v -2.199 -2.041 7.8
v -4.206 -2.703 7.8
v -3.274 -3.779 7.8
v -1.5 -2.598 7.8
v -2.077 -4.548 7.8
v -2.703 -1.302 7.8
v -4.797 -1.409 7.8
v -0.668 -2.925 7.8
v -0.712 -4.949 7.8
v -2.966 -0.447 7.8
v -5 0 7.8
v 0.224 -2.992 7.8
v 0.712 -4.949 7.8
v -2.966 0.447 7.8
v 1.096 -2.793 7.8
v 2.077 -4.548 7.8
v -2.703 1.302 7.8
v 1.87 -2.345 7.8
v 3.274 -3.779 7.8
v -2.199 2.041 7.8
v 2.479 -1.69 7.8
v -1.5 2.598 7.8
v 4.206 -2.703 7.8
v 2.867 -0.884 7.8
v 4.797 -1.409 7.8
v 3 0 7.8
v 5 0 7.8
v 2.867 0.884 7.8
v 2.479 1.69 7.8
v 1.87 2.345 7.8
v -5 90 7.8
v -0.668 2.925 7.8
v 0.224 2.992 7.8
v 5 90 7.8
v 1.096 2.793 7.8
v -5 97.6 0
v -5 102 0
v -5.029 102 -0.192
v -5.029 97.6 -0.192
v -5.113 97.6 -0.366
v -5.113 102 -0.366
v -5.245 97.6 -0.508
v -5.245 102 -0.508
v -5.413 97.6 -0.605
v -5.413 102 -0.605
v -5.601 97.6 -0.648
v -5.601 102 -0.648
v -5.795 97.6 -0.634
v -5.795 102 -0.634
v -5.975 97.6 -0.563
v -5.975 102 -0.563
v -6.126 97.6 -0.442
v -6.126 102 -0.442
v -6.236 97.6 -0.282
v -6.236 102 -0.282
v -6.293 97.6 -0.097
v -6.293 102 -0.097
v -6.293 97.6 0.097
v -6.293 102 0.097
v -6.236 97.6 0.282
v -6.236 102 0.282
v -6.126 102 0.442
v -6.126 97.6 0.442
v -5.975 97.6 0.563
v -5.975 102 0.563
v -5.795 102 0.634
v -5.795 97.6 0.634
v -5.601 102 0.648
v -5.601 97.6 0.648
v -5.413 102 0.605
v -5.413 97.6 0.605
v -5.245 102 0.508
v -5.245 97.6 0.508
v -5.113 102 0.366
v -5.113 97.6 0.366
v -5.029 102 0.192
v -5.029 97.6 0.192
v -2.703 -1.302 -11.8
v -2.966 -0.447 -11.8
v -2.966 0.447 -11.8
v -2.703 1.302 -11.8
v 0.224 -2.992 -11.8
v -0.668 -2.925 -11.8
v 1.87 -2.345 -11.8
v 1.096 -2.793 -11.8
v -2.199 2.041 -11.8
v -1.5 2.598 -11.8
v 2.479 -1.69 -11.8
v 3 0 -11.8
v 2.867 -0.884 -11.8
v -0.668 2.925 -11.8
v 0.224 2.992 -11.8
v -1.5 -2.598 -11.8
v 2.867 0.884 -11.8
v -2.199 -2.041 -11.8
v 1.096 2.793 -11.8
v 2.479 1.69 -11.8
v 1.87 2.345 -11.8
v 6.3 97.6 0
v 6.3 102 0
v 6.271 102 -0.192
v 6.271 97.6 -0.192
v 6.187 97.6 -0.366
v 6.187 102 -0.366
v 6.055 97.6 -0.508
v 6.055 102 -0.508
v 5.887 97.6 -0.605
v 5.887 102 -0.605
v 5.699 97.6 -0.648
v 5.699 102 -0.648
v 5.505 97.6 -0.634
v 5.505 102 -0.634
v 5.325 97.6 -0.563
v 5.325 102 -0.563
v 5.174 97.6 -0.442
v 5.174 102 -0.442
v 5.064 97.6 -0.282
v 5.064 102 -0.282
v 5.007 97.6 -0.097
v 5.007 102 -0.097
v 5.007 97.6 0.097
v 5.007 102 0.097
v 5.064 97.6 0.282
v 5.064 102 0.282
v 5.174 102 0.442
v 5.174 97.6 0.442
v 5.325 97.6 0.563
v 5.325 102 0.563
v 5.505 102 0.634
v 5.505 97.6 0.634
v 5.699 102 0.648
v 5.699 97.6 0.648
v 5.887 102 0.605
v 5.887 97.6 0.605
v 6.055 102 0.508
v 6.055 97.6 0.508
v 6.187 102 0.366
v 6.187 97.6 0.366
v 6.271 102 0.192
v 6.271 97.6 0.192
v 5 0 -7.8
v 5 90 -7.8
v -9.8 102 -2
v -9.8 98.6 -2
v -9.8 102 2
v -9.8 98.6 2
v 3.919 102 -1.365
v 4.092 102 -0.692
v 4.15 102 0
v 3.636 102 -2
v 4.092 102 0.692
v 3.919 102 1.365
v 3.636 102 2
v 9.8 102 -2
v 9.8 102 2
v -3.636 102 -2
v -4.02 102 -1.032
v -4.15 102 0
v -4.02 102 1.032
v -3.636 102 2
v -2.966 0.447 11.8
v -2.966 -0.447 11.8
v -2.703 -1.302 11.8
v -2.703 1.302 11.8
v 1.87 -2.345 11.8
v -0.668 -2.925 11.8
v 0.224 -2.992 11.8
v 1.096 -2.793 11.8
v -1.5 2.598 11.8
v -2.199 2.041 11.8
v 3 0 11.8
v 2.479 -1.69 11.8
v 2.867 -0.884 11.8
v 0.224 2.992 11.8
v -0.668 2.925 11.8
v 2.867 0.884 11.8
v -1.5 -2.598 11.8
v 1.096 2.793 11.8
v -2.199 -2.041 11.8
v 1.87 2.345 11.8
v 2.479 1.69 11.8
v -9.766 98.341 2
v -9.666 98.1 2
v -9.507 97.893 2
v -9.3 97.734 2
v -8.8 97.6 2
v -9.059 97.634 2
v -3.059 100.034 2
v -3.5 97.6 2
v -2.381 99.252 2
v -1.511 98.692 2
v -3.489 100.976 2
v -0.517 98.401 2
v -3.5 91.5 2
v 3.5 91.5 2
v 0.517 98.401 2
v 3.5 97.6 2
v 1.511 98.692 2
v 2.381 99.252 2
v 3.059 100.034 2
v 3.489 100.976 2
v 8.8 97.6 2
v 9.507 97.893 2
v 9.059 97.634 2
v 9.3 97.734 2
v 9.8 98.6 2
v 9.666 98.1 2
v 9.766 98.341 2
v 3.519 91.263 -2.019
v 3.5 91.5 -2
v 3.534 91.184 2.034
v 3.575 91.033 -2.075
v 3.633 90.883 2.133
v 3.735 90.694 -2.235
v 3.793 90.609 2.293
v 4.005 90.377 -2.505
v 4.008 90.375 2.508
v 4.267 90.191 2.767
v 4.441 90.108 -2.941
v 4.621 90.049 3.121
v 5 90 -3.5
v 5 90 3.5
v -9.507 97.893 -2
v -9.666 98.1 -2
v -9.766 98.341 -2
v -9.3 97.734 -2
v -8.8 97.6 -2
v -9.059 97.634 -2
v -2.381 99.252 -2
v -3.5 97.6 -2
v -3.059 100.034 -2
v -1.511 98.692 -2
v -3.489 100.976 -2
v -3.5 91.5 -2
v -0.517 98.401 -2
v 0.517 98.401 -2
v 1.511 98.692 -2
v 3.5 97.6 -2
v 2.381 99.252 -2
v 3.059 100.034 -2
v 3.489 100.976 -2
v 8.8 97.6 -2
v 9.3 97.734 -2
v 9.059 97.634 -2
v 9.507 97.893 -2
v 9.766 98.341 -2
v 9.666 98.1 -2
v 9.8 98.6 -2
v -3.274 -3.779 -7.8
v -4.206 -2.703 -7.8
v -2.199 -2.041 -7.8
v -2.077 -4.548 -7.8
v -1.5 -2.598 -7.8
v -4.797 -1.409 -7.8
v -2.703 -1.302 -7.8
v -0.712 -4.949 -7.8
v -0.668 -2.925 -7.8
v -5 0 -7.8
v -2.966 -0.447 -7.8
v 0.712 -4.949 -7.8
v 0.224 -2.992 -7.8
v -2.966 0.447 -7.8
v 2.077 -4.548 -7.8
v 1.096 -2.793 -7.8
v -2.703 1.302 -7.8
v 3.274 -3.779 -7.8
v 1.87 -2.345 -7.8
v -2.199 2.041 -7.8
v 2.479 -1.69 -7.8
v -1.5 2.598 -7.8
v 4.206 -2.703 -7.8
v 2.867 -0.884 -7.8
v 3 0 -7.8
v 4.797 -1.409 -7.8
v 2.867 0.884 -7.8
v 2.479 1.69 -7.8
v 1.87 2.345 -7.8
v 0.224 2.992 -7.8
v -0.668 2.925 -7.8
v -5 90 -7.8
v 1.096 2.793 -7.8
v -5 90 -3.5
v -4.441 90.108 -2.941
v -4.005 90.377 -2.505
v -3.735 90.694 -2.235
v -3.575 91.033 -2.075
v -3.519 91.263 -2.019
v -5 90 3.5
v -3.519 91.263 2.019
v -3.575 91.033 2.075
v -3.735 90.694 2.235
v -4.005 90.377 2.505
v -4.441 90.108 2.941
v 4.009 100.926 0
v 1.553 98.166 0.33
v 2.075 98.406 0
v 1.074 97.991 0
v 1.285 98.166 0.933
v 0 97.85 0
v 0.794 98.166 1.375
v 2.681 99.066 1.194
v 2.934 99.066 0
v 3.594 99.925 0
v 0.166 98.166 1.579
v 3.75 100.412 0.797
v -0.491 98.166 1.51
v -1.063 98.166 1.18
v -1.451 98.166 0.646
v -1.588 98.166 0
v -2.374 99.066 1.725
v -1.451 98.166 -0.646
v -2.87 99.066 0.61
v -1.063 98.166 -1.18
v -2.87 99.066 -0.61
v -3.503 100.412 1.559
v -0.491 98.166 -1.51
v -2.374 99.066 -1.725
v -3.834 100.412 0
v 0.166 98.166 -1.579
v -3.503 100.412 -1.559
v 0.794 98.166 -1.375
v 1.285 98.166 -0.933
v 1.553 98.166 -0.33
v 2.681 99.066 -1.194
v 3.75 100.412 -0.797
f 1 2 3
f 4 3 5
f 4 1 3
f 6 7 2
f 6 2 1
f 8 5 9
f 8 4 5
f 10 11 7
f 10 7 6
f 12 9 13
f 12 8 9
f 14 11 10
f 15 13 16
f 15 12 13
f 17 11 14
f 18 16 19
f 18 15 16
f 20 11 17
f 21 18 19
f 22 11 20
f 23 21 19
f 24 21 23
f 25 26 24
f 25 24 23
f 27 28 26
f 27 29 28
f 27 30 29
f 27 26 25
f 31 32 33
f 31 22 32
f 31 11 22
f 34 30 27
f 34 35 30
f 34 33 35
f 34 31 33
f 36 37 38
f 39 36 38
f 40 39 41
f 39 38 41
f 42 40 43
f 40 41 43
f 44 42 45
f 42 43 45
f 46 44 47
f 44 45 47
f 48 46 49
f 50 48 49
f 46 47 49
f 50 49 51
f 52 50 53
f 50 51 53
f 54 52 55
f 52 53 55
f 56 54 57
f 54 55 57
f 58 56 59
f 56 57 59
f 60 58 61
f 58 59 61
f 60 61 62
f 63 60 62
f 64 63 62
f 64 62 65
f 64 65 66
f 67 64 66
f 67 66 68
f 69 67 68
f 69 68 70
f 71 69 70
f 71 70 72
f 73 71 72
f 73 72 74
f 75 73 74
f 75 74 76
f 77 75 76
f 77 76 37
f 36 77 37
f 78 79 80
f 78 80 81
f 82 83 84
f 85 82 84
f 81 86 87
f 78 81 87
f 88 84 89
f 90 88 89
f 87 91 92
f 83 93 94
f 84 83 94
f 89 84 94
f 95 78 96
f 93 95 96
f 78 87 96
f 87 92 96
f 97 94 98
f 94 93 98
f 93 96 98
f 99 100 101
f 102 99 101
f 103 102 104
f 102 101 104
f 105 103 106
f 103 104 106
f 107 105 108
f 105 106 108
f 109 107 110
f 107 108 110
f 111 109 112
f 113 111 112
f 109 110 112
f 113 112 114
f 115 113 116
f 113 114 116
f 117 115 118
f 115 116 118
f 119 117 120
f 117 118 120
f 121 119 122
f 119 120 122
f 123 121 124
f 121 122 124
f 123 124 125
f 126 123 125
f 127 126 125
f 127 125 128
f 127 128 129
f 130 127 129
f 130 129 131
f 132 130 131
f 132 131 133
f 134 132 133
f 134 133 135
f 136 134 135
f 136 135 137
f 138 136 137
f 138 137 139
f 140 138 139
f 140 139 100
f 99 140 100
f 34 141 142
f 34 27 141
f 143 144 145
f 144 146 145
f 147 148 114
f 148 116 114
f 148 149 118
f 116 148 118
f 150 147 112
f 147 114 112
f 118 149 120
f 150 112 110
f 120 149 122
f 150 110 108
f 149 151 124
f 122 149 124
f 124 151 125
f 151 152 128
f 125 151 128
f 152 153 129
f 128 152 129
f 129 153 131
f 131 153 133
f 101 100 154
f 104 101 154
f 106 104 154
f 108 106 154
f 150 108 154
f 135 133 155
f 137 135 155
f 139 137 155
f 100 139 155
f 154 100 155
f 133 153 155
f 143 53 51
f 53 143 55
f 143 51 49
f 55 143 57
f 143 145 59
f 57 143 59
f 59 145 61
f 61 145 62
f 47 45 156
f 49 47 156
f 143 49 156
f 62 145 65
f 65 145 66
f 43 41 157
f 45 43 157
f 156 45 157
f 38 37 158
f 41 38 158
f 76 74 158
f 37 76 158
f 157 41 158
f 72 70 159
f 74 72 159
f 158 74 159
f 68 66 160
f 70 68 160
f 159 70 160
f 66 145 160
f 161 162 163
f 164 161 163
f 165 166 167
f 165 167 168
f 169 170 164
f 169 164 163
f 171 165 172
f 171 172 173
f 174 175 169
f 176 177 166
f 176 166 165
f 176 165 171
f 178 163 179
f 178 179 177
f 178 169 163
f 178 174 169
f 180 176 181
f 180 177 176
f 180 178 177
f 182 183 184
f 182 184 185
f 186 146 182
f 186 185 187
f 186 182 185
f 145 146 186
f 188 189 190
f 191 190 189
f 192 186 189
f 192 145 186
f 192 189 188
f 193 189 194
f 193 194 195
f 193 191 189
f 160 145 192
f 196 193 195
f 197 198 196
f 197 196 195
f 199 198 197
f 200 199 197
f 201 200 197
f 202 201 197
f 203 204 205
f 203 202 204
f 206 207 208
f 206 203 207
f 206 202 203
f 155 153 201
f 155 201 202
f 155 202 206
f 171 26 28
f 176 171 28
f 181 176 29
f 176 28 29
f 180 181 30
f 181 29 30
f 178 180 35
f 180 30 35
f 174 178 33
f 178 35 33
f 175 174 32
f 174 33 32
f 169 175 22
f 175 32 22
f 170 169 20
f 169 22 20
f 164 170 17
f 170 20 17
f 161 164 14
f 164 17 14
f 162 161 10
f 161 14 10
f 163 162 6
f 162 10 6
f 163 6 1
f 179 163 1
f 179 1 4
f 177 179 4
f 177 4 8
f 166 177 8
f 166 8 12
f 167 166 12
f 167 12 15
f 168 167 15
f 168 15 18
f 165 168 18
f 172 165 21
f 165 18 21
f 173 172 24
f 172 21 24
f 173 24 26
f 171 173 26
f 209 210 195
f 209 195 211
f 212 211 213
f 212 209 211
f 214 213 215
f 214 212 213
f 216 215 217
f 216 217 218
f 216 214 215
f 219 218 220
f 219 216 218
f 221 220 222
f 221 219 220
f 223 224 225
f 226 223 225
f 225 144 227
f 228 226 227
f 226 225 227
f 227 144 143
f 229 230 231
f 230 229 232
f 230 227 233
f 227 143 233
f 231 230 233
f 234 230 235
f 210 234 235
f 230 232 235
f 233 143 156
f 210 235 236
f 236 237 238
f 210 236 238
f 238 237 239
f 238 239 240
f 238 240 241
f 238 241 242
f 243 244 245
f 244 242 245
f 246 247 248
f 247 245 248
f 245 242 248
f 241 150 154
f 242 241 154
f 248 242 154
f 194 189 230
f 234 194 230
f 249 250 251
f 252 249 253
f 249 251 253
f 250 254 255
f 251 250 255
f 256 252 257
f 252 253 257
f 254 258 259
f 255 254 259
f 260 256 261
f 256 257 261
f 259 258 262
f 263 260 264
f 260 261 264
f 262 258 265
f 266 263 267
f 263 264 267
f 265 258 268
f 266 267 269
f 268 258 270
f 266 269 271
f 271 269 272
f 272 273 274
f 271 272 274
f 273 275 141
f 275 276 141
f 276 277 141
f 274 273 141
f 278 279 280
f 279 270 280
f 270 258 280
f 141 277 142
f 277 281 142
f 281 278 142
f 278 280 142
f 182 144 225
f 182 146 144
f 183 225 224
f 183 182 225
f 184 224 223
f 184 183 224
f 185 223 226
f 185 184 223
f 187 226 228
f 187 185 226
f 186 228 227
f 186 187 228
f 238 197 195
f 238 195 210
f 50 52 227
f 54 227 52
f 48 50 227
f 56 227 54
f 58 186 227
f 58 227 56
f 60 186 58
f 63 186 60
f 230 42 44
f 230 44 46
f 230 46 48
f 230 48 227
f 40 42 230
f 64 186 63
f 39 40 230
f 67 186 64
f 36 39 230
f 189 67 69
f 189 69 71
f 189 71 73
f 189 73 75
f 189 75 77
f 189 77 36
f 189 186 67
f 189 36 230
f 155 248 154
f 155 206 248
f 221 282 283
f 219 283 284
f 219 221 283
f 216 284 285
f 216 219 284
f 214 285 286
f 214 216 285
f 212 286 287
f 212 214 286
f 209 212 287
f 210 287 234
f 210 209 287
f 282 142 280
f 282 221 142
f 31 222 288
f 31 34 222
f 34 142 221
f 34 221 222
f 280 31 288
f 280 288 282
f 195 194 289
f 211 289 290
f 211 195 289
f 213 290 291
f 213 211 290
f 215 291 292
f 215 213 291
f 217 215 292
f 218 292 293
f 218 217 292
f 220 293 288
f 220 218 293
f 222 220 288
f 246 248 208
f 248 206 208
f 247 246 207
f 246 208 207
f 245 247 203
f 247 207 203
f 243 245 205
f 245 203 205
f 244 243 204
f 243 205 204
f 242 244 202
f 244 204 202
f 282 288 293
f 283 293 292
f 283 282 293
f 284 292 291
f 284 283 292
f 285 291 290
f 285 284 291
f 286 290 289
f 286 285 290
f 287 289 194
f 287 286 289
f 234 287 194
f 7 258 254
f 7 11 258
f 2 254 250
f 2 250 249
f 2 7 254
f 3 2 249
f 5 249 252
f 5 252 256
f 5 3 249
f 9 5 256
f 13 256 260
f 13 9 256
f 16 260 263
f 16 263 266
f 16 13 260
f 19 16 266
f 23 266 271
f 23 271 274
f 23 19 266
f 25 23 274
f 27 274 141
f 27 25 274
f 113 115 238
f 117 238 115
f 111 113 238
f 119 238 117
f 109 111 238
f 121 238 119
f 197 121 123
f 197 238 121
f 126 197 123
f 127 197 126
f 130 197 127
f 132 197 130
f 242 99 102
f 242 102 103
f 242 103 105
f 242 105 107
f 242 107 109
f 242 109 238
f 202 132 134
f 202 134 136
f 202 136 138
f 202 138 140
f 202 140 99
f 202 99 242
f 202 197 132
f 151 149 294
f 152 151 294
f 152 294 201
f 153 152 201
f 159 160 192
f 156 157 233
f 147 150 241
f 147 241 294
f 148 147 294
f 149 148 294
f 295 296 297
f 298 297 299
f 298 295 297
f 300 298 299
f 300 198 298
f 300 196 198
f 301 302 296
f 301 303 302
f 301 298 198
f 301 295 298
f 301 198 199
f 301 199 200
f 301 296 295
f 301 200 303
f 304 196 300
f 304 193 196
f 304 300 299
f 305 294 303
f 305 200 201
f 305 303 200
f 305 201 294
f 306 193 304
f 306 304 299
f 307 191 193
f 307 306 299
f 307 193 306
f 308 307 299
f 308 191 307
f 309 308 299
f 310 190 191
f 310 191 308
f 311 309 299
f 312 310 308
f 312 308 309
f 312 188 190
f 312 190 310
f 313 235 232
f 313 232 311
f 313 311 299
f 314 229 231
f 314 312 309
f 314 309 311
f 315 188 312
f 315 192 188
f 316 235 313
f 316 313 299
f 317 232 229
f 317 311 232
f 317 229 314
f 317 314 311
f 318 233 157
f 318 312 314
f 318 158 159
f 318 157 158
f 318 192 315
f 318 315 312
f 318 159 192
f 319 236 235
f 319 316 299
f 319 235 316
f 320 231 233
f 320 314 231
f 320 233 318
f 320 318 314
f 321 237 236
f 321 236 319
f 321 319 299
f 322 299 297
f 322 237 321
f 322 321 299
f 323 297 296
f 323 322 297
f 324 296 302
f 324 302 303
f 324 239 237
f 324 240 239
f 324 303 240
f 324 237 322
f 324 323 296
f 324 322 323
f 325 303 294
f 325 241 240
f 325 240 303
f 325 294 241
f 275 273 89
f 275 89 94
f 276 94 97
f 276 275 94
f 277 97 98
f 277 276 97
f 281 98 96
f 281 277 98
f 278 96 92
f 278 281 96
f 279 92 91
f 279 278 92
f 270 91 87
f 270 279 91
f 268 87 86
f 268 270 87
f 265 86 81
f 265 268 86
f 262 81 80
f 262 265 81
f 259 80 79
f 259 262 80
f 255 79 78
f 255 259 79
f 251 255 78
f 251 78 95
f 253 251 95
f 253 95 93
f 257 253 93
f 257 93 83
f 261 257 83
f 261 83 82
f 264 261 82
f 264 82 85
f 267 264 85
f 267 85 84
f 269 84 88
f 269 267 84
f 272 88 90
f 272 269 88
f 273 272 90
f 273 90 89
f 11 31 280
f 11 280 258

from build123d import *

# Parameters (mm, degrees)
EXTRUDE_1_DEPTH = 7.8
SKETCH_4_R      = 3
EXTRUDE_3_DEPTH = 4
SKETCH_5_W      = 7
SKETCH_5_H      = 4
EXTRUDE_4_DEPTH = 12
SKETCH_7_W      = 19.6
SKETCH_7_H      = 4.4
EXTRUDE_5_DEPTH = 2
FILLET_2_R      = 1
HOLE_WIZARD_1_D = 1.3
FILLET_3_R      = 1.5


with BuildPart() as part:
    # 草图1 → 凸台-拉伸1 (new, symmetric)
    with BuildSketch(Plane.XY):
        with BuildLine():
            Line((5, 0), (5, 90))
            Line((5, 90), (-5, 90))
            Line((-5, 90), (-5, 0))
            ThreePointArc((-5, 0), (0, -5), (5, 0))
        make_face()
    extrude(amount=EXTRUDE_1_DEPTH, both=True)

    # 草图4 → 凸台-拉伸3 (add)
    with BuildSketch(Plane.XY.offset(7.8)):
        Circle(SKETCH_4_R)
    extrude_3 = extrude(amount=EXTRUDE_3_DEPTH)

    # 草图5 → 凸台-拉伸4 (add)
    with BuildSketch(Plane(origin=(0, 102, 0), x_dir=(1, 0, 0), z_dir=(0, 1, 0))):
        Rectangle(SKETCH_5_W, SKETCH_5_H)
    extrude(amount=-EXTRUDE_4_DEPTH)

    # 草图7 → 凸台-拉伸5 (add, symmetric)
    with BuildSketch(Plane.XY):
        with Locations((0, 99.8)):
            Rectangle(SKETCH_7_W, SKETCH_7_H)
    extrude(amount=EXTRUDE_5_DEPTH, both=True)

    # 草图10 → 切除-旋转1 (revolve, cut)
    with BuildSketch(Plane.XY):
        with BuildLine():
            ThreePointArc((4.15, 102), (2.934493142, 104.934493142), (0, 106.15))
            Line((0, 106.15), (0, 102))
            Line((0, 102), (0, 97.85))
            ThreePointArc((0, 97.85), (2.934493142, 99.065506858), (4.15, 102))
        make_face()
    revolve(axis=Axis((0, 106.15, 0), (0, -1, 0)), mode=Mode.SUBTRACT)

    # 镜向2: 凸台-拉伸3 across plane
    add(extrude_3.mirror(Plane.XY))

    # 圆角2
    fillet_2_edges = [part.edges().sort_by_distance(p)[0] for p in [
        (-9.8, 97.6, 0),
        (9.8, 97.6, 0),
    ]]
    fillet(fillet_2_edges, radius=FILLET_2_R)

    # 孔1 (through all)
    with Locations(Plane(origin=(0, 97.6, 0), x_dir=(-1, 0, 0), z_dir=(0, -1, 0))):
        with Locations((5.65, 0), (-5.65, 0)):
            Hole(HOLE_WIZARD_1_D / 2)

    # 圆角3
    fillet_3_edges = [part.edges().sort_by_distance(p)[0] for p in [
        (0, 90, -2),
        (-3.5, 90, 0),
        (0, 90, 2),
        (3.5, 90, 0),
    ]]
    fillet(fillet_3_edges, radius=FILLET_3_R - 0.0001)  # a hair under: the kernel refuses the full size


solid = part.part
